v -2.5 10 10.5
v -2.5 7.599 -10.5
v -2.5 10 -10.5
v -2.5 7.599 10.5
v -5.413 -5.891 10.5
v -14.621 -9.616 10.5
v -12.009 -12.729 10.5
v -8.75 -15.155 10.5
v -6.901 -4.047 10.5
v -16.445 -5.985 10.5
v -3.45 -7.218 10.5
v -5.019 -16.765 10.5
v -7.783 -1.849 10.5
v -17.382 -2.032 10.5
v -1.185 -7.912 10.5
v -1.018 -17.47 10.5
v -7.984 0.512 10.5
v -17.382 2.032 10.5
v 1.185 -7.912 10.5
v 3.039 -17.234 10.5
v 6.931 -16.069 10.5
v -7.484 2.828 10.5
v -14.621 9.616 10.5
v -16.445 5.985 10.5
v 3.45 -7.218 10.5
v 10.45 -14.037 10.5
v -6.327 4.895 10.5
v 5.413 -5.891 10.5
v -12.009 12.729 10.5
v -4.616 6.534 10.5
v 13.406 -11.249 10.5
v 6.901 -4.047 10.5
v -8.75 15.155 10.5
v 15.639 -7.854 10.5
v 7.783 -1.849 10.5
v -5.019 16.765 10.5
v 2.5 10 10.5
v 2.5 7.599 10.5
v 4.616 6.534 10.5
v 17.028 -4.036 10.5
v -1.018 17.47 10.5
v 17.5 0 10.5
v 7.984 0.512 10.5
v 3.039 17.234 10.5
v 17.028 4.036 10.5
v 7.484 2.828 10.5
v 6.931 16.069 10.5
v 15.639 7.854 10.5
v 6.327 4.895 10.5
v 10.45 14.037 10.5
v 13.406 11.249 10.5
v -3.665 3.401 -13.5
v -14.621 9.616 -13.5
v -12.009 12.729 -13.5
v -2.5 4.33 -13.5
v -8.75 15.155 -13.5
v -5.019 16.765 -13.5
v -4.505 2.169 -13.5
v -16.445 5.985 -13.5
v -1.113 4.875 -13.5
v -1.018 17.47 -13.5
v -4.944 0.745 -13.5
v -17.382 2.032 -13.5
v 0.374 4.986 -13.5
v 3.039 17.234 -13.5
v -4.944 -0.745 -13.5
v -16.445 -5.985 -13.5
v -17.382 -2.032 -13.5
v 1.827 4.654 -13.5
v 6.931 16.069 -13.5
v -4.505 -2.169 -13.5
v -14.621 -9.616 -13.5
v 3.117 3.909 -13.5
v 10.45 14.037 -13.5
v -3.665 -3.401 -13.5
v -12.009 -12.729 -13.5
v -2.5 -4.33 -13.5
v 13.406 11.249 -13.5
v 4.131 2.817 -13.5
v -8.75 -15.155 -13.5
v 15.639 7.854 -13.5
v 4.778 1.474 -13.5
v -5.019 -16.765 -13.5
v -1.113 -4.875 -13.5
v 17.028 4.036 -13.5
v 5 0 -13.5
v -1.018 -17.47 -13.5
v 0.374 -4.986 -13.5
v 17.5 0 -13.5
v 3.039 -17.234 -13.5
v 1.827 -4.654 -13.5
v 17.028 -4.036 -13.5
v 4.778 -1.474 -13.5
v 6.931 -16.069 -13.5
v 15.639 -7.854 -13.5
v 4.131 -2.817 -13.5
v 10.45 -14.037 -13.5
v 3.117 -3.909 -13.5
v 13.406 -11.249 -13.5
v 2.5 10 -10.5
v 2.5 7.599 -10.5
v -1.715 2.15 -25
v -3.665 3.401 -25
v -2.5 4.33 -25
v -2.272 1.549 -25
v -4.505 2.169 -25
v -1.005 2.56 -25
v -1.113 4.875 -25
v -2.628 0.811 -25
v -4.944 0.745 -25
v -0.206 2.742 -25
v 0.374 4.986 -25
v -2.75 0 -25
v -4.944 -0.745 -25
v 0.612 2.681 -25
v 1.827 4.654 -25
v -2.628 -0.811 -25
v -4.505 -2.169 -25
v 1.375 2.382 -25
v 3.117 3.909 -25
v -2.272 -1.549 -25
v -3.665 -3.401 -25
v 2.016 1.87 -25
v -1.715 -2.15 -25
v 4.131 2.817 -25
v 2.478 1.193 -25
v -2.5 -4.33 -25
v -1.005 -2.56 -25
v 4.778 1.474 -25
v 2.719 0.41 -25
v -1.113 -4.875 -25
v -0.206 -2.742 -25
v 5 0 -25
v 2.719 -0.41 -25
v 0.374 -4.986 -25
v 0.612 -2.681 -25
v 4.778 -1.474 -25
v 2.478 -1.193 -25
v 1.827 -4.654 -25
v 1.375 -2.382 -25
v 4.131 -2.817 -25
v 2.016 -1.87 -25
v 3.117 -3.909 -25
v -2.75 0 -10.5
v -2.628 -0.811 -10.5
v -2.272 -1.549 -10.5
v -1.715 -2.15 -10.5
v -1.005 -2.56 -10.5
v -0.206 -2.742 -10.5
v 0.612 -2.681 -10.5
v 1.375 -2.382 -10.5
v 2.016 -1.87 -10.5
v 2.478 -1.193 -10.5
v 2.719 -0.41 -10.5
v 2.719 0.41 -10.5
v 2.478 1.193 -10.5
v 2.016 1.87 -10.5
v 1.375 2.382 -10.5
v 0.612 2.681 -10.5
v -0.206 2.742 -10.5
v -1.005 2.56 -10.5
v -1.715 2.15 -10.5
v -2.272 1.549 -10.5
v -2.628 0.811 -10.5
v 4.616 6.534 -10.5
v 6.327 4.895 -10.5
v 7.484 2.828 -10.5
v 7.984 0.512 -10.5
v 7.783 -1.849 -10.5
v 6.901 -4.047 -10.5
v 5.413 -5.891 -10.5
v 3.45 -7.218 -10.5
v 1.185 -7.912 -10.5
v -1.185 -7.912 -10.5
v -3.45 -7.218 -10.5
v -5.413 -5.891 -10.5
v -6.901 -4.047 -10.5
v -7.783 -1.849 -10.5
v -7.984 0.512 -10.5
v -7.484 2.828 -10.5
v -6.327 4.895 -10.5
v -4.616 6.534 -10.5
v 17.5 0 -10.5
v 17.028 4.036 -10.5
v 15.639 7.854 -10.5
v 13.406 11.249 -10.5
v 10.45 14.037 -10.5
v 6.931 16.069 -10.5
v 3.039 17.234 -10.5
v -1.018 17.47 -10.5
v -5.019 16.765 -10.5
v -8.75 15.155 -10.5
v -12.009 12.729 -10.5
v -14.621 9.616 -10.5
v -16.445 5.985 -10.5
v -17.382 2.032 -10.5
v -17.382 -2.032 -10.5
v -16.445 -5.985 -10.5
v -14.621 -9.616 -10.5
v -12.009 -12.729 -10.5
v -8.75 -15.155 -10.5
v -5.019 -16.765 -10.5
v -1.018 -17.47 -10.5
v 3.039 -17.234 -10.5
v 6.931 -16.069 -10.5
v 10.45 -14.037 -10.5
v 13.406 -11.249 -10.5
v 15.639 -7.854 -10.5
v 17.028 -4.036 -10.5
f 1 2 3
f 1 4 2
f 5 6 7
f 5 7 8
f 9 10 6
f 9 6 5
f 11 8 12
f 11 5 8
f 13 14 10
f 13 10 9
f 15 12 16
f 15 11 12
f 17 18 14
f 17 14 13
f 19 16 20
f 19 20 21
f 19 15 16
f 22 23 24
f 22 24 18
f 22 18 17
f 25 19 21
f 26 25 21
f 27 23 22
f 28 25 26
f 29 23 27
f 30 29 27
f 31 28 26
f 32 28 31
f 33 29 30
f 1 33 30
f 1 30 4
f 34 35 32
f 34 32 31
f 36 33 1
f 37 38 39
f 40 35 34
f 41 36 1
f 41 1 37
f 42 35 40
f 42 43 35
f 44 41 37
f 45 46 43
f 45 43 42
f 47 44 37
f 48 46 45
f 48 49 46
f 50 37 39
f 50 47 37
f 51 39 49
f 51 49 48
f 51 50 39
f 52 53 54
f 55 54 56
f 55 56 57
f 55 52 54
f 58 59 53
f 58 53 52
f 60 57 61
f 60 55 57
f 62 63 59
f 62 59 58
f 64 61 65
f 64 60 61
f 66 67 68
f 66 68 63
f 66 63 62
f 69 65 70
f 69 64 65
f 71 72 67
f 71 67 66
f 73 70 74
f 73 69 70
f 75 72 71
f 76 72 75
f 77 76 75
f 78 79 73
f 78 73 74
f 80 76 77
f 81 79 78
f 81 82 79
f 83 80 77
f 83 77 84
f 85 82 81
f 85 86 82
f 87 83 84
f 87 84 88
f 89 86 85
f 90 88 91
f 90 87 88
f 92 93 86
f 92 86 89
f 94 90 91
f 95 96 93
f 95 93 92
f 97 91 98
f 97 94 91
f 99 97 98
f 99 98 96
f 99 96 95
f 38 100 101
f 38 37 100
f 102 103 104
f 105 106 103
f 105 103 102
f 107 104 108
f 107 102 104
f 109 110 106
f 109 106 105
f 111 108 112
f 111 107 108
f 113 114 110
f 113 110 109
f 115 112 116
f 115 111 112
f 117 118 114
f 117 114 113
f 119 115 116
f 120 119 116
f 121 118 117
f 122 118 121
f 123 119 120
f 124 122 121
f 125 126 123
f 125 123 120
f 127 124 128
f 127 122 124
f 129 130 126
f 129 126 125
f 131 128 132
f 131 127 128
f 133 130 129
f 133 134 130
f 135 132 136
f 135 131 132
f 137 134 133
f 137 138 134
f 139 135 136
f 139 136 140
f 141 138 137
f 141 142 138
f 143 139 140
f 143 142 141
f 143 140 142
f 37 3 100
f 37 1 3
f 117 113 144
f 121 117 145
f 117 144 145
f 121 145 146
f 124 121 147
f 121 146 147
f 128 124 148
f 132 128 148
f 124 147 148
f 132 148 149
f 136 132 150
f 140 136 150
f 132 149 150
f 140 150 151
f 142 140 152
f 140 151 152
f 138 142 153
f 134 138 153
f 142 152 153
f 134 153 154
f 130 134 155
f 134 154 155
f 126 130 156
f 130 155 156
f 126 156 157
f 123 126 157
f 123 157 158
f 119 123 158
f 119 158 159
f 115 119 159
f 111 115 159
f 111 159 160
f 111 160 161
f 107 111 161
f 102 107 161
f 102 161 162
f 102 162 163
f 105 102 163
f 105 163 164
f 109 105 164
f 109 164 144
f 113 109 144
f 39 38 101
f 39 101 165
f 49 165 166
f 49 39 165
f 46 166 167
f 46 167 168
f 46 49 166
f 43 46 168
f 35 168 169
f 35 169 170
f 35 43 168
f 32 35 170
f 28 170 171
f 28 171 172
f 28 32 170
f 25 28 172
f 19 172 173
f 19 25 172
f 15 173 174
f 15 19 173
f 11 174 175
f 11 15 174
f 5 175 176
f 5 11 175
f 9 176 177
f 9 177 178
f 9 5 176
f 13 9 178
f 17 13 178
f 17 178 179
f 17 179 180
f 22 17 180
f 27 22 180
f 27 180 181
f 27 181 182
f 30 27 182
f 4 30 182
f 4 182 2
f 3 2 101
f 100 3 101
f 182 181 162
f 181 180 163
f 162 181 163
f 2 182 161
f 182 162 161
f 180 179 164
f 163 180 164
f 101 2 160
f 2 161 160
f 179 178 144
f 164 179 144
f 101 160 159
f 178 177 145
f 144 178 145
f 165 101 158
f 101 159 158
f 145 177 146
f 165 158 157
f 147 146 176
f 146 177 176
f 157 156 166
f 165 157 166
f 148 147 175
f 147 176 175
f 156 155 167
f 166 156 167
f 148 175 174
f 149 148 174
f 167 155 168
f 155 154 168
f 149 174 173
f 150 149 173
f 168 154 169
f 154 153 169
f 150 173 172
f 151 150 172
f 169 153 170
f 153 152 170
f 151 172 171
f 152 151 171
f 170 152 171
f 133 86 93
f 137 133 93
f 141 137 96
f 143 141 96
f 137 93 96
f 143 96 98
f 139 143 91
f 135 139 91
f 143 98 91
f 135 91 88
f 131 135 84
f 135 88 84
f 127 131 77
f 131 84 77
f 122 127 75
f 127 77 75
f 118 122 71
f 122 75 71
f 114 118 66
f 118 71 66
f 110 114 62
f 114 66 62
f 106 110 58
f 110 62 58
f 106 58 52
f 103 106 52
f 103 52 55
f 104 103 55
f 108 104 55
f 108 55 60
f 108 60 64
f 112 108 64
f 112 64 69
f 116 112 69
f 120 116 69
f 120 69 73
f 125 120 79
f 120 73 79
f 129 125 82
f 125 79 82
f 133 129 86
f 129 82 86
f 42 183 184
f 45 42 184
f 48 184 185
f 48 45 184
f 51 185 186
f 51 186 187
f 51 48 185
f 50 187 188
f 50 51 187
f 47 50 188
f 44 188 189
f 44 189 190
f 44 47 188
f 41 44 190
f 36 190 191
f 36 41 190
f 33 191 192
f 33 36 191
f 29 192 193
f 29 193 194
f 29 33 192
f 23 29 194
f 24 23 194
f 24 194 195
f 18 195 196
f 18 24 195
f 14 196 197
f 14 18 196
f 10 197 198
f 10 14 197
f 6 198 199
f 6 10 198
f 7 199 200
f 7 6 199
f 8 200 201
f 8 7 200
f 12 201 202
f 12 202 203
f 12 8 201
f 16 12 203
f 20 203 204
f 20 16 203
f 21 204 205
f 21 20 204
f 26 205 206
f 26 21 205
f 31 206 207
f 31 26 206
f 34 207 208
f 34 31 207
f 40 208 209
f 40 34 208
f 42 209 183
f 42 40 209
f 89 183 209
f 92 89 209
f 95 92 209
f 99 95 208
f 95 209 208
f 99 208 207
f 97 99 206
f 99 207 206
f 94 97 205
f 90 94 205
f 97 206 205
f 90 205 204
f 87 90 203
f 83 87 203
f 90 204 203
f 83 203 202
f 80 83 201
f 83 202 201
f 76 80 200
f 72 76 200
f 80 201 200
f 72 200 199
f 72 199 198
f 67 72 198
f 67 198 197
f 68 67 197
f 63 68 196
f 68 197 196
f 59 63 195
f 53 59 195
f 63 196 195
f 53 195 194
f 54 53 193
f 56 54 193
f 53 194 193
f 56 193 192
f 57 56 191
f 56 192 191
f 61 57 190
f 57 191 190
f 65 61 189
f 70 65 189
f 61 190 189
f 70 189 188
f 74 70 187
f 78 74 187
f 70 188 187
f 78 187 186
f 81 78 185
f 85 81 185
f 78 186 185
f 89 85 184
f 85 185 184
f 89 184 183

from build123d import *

# Parameters (mm, degrees)
F0_R     = 17.5
F1_DEPTH = 10.5
F2_R     = 17.5
F3_DEPTH = 3
F4_R     = 5
F5_DEPTH = 11.5
F7_D     = 5.5
F7_DEPTH = 30
F7_TIP   = 1.6523667023


with BuildPart() as f1:
    # F0 (on Top) → F1 (new body, symmetric)
    with BuildSketch(Plane.XY):
        Circle(F0_R)
        with BuildLine():
            ThreePointArc((2.5, 7.5993420768), (0, -8), (-2.5, 7.5993420768))
            Line((-2.5, 7.5993420768), (-2.5, 10))
            Line((-2.5, 10), (2.5, 10))
            Line((2.5, 10), (2.5, 7.5993420768))
        make_face(mode=Mode.SUBTRACT)
    extrude(amount=F1_DEPTH, both=True)

    # F2 (on face) → F3 (join)
    with BuildSketch(Plane(origin=(0, 0, -10.5), x_dir=(1, 0, 0), z_dir=(0, 0, -1))):
        Circle(F2_R)
        with BuildLine():
            Line((-2.5, -10), (-2.5, -7.5993420768))
            ThreePointArc((-2.5, -7.5993420768), (0, 8), (2.5, -7.5993420768))
            Line((2.5, -7.5993420768), (2.5, -10))
            Line((2.5, -10), (-2.5, -10))
        make_face(mode=Mode.SUBTRACT)
        with BuildLine():
            ThreePointArc((2.5, -7.5993420768), (0, 8), (-2.5, -7.5993420768))
            Line((-2.5, -7.5993420768), (-2.5, -10))
            Line((-2.5, -10), (2.5, -10))
            Line((2.5, -10), (2.5, -7.5993420768))
        make_face()
    extrude(amount=F3_DEPTH)

    # F4 (on face) → F5 (join)
    with BuildSketch(Plane(origin=(0, 0, -13.5), x_dir=(1, 0, 0), z_dir=(0, 0, -1))):
        Circle(F4_R)
    extrude(amount=F5_DEPTH)

    # F7
    with Locations(Plane(origin=(0, 0, -25), x_dir=(1, 0, 0), z_dir=(0, 0, -1))):
        with Locations((0, 0)):
            Hole(F7_D / 2, depth=F7_DEPTH)
            with Locations((0, 0, -(F7_DEPTH + F7_TIP / 2))):  # 118° drill point
                Cone(0, F7_D / 2, F7_TIP, mode=Mode.SUBTRACT)


solid = f1.part
